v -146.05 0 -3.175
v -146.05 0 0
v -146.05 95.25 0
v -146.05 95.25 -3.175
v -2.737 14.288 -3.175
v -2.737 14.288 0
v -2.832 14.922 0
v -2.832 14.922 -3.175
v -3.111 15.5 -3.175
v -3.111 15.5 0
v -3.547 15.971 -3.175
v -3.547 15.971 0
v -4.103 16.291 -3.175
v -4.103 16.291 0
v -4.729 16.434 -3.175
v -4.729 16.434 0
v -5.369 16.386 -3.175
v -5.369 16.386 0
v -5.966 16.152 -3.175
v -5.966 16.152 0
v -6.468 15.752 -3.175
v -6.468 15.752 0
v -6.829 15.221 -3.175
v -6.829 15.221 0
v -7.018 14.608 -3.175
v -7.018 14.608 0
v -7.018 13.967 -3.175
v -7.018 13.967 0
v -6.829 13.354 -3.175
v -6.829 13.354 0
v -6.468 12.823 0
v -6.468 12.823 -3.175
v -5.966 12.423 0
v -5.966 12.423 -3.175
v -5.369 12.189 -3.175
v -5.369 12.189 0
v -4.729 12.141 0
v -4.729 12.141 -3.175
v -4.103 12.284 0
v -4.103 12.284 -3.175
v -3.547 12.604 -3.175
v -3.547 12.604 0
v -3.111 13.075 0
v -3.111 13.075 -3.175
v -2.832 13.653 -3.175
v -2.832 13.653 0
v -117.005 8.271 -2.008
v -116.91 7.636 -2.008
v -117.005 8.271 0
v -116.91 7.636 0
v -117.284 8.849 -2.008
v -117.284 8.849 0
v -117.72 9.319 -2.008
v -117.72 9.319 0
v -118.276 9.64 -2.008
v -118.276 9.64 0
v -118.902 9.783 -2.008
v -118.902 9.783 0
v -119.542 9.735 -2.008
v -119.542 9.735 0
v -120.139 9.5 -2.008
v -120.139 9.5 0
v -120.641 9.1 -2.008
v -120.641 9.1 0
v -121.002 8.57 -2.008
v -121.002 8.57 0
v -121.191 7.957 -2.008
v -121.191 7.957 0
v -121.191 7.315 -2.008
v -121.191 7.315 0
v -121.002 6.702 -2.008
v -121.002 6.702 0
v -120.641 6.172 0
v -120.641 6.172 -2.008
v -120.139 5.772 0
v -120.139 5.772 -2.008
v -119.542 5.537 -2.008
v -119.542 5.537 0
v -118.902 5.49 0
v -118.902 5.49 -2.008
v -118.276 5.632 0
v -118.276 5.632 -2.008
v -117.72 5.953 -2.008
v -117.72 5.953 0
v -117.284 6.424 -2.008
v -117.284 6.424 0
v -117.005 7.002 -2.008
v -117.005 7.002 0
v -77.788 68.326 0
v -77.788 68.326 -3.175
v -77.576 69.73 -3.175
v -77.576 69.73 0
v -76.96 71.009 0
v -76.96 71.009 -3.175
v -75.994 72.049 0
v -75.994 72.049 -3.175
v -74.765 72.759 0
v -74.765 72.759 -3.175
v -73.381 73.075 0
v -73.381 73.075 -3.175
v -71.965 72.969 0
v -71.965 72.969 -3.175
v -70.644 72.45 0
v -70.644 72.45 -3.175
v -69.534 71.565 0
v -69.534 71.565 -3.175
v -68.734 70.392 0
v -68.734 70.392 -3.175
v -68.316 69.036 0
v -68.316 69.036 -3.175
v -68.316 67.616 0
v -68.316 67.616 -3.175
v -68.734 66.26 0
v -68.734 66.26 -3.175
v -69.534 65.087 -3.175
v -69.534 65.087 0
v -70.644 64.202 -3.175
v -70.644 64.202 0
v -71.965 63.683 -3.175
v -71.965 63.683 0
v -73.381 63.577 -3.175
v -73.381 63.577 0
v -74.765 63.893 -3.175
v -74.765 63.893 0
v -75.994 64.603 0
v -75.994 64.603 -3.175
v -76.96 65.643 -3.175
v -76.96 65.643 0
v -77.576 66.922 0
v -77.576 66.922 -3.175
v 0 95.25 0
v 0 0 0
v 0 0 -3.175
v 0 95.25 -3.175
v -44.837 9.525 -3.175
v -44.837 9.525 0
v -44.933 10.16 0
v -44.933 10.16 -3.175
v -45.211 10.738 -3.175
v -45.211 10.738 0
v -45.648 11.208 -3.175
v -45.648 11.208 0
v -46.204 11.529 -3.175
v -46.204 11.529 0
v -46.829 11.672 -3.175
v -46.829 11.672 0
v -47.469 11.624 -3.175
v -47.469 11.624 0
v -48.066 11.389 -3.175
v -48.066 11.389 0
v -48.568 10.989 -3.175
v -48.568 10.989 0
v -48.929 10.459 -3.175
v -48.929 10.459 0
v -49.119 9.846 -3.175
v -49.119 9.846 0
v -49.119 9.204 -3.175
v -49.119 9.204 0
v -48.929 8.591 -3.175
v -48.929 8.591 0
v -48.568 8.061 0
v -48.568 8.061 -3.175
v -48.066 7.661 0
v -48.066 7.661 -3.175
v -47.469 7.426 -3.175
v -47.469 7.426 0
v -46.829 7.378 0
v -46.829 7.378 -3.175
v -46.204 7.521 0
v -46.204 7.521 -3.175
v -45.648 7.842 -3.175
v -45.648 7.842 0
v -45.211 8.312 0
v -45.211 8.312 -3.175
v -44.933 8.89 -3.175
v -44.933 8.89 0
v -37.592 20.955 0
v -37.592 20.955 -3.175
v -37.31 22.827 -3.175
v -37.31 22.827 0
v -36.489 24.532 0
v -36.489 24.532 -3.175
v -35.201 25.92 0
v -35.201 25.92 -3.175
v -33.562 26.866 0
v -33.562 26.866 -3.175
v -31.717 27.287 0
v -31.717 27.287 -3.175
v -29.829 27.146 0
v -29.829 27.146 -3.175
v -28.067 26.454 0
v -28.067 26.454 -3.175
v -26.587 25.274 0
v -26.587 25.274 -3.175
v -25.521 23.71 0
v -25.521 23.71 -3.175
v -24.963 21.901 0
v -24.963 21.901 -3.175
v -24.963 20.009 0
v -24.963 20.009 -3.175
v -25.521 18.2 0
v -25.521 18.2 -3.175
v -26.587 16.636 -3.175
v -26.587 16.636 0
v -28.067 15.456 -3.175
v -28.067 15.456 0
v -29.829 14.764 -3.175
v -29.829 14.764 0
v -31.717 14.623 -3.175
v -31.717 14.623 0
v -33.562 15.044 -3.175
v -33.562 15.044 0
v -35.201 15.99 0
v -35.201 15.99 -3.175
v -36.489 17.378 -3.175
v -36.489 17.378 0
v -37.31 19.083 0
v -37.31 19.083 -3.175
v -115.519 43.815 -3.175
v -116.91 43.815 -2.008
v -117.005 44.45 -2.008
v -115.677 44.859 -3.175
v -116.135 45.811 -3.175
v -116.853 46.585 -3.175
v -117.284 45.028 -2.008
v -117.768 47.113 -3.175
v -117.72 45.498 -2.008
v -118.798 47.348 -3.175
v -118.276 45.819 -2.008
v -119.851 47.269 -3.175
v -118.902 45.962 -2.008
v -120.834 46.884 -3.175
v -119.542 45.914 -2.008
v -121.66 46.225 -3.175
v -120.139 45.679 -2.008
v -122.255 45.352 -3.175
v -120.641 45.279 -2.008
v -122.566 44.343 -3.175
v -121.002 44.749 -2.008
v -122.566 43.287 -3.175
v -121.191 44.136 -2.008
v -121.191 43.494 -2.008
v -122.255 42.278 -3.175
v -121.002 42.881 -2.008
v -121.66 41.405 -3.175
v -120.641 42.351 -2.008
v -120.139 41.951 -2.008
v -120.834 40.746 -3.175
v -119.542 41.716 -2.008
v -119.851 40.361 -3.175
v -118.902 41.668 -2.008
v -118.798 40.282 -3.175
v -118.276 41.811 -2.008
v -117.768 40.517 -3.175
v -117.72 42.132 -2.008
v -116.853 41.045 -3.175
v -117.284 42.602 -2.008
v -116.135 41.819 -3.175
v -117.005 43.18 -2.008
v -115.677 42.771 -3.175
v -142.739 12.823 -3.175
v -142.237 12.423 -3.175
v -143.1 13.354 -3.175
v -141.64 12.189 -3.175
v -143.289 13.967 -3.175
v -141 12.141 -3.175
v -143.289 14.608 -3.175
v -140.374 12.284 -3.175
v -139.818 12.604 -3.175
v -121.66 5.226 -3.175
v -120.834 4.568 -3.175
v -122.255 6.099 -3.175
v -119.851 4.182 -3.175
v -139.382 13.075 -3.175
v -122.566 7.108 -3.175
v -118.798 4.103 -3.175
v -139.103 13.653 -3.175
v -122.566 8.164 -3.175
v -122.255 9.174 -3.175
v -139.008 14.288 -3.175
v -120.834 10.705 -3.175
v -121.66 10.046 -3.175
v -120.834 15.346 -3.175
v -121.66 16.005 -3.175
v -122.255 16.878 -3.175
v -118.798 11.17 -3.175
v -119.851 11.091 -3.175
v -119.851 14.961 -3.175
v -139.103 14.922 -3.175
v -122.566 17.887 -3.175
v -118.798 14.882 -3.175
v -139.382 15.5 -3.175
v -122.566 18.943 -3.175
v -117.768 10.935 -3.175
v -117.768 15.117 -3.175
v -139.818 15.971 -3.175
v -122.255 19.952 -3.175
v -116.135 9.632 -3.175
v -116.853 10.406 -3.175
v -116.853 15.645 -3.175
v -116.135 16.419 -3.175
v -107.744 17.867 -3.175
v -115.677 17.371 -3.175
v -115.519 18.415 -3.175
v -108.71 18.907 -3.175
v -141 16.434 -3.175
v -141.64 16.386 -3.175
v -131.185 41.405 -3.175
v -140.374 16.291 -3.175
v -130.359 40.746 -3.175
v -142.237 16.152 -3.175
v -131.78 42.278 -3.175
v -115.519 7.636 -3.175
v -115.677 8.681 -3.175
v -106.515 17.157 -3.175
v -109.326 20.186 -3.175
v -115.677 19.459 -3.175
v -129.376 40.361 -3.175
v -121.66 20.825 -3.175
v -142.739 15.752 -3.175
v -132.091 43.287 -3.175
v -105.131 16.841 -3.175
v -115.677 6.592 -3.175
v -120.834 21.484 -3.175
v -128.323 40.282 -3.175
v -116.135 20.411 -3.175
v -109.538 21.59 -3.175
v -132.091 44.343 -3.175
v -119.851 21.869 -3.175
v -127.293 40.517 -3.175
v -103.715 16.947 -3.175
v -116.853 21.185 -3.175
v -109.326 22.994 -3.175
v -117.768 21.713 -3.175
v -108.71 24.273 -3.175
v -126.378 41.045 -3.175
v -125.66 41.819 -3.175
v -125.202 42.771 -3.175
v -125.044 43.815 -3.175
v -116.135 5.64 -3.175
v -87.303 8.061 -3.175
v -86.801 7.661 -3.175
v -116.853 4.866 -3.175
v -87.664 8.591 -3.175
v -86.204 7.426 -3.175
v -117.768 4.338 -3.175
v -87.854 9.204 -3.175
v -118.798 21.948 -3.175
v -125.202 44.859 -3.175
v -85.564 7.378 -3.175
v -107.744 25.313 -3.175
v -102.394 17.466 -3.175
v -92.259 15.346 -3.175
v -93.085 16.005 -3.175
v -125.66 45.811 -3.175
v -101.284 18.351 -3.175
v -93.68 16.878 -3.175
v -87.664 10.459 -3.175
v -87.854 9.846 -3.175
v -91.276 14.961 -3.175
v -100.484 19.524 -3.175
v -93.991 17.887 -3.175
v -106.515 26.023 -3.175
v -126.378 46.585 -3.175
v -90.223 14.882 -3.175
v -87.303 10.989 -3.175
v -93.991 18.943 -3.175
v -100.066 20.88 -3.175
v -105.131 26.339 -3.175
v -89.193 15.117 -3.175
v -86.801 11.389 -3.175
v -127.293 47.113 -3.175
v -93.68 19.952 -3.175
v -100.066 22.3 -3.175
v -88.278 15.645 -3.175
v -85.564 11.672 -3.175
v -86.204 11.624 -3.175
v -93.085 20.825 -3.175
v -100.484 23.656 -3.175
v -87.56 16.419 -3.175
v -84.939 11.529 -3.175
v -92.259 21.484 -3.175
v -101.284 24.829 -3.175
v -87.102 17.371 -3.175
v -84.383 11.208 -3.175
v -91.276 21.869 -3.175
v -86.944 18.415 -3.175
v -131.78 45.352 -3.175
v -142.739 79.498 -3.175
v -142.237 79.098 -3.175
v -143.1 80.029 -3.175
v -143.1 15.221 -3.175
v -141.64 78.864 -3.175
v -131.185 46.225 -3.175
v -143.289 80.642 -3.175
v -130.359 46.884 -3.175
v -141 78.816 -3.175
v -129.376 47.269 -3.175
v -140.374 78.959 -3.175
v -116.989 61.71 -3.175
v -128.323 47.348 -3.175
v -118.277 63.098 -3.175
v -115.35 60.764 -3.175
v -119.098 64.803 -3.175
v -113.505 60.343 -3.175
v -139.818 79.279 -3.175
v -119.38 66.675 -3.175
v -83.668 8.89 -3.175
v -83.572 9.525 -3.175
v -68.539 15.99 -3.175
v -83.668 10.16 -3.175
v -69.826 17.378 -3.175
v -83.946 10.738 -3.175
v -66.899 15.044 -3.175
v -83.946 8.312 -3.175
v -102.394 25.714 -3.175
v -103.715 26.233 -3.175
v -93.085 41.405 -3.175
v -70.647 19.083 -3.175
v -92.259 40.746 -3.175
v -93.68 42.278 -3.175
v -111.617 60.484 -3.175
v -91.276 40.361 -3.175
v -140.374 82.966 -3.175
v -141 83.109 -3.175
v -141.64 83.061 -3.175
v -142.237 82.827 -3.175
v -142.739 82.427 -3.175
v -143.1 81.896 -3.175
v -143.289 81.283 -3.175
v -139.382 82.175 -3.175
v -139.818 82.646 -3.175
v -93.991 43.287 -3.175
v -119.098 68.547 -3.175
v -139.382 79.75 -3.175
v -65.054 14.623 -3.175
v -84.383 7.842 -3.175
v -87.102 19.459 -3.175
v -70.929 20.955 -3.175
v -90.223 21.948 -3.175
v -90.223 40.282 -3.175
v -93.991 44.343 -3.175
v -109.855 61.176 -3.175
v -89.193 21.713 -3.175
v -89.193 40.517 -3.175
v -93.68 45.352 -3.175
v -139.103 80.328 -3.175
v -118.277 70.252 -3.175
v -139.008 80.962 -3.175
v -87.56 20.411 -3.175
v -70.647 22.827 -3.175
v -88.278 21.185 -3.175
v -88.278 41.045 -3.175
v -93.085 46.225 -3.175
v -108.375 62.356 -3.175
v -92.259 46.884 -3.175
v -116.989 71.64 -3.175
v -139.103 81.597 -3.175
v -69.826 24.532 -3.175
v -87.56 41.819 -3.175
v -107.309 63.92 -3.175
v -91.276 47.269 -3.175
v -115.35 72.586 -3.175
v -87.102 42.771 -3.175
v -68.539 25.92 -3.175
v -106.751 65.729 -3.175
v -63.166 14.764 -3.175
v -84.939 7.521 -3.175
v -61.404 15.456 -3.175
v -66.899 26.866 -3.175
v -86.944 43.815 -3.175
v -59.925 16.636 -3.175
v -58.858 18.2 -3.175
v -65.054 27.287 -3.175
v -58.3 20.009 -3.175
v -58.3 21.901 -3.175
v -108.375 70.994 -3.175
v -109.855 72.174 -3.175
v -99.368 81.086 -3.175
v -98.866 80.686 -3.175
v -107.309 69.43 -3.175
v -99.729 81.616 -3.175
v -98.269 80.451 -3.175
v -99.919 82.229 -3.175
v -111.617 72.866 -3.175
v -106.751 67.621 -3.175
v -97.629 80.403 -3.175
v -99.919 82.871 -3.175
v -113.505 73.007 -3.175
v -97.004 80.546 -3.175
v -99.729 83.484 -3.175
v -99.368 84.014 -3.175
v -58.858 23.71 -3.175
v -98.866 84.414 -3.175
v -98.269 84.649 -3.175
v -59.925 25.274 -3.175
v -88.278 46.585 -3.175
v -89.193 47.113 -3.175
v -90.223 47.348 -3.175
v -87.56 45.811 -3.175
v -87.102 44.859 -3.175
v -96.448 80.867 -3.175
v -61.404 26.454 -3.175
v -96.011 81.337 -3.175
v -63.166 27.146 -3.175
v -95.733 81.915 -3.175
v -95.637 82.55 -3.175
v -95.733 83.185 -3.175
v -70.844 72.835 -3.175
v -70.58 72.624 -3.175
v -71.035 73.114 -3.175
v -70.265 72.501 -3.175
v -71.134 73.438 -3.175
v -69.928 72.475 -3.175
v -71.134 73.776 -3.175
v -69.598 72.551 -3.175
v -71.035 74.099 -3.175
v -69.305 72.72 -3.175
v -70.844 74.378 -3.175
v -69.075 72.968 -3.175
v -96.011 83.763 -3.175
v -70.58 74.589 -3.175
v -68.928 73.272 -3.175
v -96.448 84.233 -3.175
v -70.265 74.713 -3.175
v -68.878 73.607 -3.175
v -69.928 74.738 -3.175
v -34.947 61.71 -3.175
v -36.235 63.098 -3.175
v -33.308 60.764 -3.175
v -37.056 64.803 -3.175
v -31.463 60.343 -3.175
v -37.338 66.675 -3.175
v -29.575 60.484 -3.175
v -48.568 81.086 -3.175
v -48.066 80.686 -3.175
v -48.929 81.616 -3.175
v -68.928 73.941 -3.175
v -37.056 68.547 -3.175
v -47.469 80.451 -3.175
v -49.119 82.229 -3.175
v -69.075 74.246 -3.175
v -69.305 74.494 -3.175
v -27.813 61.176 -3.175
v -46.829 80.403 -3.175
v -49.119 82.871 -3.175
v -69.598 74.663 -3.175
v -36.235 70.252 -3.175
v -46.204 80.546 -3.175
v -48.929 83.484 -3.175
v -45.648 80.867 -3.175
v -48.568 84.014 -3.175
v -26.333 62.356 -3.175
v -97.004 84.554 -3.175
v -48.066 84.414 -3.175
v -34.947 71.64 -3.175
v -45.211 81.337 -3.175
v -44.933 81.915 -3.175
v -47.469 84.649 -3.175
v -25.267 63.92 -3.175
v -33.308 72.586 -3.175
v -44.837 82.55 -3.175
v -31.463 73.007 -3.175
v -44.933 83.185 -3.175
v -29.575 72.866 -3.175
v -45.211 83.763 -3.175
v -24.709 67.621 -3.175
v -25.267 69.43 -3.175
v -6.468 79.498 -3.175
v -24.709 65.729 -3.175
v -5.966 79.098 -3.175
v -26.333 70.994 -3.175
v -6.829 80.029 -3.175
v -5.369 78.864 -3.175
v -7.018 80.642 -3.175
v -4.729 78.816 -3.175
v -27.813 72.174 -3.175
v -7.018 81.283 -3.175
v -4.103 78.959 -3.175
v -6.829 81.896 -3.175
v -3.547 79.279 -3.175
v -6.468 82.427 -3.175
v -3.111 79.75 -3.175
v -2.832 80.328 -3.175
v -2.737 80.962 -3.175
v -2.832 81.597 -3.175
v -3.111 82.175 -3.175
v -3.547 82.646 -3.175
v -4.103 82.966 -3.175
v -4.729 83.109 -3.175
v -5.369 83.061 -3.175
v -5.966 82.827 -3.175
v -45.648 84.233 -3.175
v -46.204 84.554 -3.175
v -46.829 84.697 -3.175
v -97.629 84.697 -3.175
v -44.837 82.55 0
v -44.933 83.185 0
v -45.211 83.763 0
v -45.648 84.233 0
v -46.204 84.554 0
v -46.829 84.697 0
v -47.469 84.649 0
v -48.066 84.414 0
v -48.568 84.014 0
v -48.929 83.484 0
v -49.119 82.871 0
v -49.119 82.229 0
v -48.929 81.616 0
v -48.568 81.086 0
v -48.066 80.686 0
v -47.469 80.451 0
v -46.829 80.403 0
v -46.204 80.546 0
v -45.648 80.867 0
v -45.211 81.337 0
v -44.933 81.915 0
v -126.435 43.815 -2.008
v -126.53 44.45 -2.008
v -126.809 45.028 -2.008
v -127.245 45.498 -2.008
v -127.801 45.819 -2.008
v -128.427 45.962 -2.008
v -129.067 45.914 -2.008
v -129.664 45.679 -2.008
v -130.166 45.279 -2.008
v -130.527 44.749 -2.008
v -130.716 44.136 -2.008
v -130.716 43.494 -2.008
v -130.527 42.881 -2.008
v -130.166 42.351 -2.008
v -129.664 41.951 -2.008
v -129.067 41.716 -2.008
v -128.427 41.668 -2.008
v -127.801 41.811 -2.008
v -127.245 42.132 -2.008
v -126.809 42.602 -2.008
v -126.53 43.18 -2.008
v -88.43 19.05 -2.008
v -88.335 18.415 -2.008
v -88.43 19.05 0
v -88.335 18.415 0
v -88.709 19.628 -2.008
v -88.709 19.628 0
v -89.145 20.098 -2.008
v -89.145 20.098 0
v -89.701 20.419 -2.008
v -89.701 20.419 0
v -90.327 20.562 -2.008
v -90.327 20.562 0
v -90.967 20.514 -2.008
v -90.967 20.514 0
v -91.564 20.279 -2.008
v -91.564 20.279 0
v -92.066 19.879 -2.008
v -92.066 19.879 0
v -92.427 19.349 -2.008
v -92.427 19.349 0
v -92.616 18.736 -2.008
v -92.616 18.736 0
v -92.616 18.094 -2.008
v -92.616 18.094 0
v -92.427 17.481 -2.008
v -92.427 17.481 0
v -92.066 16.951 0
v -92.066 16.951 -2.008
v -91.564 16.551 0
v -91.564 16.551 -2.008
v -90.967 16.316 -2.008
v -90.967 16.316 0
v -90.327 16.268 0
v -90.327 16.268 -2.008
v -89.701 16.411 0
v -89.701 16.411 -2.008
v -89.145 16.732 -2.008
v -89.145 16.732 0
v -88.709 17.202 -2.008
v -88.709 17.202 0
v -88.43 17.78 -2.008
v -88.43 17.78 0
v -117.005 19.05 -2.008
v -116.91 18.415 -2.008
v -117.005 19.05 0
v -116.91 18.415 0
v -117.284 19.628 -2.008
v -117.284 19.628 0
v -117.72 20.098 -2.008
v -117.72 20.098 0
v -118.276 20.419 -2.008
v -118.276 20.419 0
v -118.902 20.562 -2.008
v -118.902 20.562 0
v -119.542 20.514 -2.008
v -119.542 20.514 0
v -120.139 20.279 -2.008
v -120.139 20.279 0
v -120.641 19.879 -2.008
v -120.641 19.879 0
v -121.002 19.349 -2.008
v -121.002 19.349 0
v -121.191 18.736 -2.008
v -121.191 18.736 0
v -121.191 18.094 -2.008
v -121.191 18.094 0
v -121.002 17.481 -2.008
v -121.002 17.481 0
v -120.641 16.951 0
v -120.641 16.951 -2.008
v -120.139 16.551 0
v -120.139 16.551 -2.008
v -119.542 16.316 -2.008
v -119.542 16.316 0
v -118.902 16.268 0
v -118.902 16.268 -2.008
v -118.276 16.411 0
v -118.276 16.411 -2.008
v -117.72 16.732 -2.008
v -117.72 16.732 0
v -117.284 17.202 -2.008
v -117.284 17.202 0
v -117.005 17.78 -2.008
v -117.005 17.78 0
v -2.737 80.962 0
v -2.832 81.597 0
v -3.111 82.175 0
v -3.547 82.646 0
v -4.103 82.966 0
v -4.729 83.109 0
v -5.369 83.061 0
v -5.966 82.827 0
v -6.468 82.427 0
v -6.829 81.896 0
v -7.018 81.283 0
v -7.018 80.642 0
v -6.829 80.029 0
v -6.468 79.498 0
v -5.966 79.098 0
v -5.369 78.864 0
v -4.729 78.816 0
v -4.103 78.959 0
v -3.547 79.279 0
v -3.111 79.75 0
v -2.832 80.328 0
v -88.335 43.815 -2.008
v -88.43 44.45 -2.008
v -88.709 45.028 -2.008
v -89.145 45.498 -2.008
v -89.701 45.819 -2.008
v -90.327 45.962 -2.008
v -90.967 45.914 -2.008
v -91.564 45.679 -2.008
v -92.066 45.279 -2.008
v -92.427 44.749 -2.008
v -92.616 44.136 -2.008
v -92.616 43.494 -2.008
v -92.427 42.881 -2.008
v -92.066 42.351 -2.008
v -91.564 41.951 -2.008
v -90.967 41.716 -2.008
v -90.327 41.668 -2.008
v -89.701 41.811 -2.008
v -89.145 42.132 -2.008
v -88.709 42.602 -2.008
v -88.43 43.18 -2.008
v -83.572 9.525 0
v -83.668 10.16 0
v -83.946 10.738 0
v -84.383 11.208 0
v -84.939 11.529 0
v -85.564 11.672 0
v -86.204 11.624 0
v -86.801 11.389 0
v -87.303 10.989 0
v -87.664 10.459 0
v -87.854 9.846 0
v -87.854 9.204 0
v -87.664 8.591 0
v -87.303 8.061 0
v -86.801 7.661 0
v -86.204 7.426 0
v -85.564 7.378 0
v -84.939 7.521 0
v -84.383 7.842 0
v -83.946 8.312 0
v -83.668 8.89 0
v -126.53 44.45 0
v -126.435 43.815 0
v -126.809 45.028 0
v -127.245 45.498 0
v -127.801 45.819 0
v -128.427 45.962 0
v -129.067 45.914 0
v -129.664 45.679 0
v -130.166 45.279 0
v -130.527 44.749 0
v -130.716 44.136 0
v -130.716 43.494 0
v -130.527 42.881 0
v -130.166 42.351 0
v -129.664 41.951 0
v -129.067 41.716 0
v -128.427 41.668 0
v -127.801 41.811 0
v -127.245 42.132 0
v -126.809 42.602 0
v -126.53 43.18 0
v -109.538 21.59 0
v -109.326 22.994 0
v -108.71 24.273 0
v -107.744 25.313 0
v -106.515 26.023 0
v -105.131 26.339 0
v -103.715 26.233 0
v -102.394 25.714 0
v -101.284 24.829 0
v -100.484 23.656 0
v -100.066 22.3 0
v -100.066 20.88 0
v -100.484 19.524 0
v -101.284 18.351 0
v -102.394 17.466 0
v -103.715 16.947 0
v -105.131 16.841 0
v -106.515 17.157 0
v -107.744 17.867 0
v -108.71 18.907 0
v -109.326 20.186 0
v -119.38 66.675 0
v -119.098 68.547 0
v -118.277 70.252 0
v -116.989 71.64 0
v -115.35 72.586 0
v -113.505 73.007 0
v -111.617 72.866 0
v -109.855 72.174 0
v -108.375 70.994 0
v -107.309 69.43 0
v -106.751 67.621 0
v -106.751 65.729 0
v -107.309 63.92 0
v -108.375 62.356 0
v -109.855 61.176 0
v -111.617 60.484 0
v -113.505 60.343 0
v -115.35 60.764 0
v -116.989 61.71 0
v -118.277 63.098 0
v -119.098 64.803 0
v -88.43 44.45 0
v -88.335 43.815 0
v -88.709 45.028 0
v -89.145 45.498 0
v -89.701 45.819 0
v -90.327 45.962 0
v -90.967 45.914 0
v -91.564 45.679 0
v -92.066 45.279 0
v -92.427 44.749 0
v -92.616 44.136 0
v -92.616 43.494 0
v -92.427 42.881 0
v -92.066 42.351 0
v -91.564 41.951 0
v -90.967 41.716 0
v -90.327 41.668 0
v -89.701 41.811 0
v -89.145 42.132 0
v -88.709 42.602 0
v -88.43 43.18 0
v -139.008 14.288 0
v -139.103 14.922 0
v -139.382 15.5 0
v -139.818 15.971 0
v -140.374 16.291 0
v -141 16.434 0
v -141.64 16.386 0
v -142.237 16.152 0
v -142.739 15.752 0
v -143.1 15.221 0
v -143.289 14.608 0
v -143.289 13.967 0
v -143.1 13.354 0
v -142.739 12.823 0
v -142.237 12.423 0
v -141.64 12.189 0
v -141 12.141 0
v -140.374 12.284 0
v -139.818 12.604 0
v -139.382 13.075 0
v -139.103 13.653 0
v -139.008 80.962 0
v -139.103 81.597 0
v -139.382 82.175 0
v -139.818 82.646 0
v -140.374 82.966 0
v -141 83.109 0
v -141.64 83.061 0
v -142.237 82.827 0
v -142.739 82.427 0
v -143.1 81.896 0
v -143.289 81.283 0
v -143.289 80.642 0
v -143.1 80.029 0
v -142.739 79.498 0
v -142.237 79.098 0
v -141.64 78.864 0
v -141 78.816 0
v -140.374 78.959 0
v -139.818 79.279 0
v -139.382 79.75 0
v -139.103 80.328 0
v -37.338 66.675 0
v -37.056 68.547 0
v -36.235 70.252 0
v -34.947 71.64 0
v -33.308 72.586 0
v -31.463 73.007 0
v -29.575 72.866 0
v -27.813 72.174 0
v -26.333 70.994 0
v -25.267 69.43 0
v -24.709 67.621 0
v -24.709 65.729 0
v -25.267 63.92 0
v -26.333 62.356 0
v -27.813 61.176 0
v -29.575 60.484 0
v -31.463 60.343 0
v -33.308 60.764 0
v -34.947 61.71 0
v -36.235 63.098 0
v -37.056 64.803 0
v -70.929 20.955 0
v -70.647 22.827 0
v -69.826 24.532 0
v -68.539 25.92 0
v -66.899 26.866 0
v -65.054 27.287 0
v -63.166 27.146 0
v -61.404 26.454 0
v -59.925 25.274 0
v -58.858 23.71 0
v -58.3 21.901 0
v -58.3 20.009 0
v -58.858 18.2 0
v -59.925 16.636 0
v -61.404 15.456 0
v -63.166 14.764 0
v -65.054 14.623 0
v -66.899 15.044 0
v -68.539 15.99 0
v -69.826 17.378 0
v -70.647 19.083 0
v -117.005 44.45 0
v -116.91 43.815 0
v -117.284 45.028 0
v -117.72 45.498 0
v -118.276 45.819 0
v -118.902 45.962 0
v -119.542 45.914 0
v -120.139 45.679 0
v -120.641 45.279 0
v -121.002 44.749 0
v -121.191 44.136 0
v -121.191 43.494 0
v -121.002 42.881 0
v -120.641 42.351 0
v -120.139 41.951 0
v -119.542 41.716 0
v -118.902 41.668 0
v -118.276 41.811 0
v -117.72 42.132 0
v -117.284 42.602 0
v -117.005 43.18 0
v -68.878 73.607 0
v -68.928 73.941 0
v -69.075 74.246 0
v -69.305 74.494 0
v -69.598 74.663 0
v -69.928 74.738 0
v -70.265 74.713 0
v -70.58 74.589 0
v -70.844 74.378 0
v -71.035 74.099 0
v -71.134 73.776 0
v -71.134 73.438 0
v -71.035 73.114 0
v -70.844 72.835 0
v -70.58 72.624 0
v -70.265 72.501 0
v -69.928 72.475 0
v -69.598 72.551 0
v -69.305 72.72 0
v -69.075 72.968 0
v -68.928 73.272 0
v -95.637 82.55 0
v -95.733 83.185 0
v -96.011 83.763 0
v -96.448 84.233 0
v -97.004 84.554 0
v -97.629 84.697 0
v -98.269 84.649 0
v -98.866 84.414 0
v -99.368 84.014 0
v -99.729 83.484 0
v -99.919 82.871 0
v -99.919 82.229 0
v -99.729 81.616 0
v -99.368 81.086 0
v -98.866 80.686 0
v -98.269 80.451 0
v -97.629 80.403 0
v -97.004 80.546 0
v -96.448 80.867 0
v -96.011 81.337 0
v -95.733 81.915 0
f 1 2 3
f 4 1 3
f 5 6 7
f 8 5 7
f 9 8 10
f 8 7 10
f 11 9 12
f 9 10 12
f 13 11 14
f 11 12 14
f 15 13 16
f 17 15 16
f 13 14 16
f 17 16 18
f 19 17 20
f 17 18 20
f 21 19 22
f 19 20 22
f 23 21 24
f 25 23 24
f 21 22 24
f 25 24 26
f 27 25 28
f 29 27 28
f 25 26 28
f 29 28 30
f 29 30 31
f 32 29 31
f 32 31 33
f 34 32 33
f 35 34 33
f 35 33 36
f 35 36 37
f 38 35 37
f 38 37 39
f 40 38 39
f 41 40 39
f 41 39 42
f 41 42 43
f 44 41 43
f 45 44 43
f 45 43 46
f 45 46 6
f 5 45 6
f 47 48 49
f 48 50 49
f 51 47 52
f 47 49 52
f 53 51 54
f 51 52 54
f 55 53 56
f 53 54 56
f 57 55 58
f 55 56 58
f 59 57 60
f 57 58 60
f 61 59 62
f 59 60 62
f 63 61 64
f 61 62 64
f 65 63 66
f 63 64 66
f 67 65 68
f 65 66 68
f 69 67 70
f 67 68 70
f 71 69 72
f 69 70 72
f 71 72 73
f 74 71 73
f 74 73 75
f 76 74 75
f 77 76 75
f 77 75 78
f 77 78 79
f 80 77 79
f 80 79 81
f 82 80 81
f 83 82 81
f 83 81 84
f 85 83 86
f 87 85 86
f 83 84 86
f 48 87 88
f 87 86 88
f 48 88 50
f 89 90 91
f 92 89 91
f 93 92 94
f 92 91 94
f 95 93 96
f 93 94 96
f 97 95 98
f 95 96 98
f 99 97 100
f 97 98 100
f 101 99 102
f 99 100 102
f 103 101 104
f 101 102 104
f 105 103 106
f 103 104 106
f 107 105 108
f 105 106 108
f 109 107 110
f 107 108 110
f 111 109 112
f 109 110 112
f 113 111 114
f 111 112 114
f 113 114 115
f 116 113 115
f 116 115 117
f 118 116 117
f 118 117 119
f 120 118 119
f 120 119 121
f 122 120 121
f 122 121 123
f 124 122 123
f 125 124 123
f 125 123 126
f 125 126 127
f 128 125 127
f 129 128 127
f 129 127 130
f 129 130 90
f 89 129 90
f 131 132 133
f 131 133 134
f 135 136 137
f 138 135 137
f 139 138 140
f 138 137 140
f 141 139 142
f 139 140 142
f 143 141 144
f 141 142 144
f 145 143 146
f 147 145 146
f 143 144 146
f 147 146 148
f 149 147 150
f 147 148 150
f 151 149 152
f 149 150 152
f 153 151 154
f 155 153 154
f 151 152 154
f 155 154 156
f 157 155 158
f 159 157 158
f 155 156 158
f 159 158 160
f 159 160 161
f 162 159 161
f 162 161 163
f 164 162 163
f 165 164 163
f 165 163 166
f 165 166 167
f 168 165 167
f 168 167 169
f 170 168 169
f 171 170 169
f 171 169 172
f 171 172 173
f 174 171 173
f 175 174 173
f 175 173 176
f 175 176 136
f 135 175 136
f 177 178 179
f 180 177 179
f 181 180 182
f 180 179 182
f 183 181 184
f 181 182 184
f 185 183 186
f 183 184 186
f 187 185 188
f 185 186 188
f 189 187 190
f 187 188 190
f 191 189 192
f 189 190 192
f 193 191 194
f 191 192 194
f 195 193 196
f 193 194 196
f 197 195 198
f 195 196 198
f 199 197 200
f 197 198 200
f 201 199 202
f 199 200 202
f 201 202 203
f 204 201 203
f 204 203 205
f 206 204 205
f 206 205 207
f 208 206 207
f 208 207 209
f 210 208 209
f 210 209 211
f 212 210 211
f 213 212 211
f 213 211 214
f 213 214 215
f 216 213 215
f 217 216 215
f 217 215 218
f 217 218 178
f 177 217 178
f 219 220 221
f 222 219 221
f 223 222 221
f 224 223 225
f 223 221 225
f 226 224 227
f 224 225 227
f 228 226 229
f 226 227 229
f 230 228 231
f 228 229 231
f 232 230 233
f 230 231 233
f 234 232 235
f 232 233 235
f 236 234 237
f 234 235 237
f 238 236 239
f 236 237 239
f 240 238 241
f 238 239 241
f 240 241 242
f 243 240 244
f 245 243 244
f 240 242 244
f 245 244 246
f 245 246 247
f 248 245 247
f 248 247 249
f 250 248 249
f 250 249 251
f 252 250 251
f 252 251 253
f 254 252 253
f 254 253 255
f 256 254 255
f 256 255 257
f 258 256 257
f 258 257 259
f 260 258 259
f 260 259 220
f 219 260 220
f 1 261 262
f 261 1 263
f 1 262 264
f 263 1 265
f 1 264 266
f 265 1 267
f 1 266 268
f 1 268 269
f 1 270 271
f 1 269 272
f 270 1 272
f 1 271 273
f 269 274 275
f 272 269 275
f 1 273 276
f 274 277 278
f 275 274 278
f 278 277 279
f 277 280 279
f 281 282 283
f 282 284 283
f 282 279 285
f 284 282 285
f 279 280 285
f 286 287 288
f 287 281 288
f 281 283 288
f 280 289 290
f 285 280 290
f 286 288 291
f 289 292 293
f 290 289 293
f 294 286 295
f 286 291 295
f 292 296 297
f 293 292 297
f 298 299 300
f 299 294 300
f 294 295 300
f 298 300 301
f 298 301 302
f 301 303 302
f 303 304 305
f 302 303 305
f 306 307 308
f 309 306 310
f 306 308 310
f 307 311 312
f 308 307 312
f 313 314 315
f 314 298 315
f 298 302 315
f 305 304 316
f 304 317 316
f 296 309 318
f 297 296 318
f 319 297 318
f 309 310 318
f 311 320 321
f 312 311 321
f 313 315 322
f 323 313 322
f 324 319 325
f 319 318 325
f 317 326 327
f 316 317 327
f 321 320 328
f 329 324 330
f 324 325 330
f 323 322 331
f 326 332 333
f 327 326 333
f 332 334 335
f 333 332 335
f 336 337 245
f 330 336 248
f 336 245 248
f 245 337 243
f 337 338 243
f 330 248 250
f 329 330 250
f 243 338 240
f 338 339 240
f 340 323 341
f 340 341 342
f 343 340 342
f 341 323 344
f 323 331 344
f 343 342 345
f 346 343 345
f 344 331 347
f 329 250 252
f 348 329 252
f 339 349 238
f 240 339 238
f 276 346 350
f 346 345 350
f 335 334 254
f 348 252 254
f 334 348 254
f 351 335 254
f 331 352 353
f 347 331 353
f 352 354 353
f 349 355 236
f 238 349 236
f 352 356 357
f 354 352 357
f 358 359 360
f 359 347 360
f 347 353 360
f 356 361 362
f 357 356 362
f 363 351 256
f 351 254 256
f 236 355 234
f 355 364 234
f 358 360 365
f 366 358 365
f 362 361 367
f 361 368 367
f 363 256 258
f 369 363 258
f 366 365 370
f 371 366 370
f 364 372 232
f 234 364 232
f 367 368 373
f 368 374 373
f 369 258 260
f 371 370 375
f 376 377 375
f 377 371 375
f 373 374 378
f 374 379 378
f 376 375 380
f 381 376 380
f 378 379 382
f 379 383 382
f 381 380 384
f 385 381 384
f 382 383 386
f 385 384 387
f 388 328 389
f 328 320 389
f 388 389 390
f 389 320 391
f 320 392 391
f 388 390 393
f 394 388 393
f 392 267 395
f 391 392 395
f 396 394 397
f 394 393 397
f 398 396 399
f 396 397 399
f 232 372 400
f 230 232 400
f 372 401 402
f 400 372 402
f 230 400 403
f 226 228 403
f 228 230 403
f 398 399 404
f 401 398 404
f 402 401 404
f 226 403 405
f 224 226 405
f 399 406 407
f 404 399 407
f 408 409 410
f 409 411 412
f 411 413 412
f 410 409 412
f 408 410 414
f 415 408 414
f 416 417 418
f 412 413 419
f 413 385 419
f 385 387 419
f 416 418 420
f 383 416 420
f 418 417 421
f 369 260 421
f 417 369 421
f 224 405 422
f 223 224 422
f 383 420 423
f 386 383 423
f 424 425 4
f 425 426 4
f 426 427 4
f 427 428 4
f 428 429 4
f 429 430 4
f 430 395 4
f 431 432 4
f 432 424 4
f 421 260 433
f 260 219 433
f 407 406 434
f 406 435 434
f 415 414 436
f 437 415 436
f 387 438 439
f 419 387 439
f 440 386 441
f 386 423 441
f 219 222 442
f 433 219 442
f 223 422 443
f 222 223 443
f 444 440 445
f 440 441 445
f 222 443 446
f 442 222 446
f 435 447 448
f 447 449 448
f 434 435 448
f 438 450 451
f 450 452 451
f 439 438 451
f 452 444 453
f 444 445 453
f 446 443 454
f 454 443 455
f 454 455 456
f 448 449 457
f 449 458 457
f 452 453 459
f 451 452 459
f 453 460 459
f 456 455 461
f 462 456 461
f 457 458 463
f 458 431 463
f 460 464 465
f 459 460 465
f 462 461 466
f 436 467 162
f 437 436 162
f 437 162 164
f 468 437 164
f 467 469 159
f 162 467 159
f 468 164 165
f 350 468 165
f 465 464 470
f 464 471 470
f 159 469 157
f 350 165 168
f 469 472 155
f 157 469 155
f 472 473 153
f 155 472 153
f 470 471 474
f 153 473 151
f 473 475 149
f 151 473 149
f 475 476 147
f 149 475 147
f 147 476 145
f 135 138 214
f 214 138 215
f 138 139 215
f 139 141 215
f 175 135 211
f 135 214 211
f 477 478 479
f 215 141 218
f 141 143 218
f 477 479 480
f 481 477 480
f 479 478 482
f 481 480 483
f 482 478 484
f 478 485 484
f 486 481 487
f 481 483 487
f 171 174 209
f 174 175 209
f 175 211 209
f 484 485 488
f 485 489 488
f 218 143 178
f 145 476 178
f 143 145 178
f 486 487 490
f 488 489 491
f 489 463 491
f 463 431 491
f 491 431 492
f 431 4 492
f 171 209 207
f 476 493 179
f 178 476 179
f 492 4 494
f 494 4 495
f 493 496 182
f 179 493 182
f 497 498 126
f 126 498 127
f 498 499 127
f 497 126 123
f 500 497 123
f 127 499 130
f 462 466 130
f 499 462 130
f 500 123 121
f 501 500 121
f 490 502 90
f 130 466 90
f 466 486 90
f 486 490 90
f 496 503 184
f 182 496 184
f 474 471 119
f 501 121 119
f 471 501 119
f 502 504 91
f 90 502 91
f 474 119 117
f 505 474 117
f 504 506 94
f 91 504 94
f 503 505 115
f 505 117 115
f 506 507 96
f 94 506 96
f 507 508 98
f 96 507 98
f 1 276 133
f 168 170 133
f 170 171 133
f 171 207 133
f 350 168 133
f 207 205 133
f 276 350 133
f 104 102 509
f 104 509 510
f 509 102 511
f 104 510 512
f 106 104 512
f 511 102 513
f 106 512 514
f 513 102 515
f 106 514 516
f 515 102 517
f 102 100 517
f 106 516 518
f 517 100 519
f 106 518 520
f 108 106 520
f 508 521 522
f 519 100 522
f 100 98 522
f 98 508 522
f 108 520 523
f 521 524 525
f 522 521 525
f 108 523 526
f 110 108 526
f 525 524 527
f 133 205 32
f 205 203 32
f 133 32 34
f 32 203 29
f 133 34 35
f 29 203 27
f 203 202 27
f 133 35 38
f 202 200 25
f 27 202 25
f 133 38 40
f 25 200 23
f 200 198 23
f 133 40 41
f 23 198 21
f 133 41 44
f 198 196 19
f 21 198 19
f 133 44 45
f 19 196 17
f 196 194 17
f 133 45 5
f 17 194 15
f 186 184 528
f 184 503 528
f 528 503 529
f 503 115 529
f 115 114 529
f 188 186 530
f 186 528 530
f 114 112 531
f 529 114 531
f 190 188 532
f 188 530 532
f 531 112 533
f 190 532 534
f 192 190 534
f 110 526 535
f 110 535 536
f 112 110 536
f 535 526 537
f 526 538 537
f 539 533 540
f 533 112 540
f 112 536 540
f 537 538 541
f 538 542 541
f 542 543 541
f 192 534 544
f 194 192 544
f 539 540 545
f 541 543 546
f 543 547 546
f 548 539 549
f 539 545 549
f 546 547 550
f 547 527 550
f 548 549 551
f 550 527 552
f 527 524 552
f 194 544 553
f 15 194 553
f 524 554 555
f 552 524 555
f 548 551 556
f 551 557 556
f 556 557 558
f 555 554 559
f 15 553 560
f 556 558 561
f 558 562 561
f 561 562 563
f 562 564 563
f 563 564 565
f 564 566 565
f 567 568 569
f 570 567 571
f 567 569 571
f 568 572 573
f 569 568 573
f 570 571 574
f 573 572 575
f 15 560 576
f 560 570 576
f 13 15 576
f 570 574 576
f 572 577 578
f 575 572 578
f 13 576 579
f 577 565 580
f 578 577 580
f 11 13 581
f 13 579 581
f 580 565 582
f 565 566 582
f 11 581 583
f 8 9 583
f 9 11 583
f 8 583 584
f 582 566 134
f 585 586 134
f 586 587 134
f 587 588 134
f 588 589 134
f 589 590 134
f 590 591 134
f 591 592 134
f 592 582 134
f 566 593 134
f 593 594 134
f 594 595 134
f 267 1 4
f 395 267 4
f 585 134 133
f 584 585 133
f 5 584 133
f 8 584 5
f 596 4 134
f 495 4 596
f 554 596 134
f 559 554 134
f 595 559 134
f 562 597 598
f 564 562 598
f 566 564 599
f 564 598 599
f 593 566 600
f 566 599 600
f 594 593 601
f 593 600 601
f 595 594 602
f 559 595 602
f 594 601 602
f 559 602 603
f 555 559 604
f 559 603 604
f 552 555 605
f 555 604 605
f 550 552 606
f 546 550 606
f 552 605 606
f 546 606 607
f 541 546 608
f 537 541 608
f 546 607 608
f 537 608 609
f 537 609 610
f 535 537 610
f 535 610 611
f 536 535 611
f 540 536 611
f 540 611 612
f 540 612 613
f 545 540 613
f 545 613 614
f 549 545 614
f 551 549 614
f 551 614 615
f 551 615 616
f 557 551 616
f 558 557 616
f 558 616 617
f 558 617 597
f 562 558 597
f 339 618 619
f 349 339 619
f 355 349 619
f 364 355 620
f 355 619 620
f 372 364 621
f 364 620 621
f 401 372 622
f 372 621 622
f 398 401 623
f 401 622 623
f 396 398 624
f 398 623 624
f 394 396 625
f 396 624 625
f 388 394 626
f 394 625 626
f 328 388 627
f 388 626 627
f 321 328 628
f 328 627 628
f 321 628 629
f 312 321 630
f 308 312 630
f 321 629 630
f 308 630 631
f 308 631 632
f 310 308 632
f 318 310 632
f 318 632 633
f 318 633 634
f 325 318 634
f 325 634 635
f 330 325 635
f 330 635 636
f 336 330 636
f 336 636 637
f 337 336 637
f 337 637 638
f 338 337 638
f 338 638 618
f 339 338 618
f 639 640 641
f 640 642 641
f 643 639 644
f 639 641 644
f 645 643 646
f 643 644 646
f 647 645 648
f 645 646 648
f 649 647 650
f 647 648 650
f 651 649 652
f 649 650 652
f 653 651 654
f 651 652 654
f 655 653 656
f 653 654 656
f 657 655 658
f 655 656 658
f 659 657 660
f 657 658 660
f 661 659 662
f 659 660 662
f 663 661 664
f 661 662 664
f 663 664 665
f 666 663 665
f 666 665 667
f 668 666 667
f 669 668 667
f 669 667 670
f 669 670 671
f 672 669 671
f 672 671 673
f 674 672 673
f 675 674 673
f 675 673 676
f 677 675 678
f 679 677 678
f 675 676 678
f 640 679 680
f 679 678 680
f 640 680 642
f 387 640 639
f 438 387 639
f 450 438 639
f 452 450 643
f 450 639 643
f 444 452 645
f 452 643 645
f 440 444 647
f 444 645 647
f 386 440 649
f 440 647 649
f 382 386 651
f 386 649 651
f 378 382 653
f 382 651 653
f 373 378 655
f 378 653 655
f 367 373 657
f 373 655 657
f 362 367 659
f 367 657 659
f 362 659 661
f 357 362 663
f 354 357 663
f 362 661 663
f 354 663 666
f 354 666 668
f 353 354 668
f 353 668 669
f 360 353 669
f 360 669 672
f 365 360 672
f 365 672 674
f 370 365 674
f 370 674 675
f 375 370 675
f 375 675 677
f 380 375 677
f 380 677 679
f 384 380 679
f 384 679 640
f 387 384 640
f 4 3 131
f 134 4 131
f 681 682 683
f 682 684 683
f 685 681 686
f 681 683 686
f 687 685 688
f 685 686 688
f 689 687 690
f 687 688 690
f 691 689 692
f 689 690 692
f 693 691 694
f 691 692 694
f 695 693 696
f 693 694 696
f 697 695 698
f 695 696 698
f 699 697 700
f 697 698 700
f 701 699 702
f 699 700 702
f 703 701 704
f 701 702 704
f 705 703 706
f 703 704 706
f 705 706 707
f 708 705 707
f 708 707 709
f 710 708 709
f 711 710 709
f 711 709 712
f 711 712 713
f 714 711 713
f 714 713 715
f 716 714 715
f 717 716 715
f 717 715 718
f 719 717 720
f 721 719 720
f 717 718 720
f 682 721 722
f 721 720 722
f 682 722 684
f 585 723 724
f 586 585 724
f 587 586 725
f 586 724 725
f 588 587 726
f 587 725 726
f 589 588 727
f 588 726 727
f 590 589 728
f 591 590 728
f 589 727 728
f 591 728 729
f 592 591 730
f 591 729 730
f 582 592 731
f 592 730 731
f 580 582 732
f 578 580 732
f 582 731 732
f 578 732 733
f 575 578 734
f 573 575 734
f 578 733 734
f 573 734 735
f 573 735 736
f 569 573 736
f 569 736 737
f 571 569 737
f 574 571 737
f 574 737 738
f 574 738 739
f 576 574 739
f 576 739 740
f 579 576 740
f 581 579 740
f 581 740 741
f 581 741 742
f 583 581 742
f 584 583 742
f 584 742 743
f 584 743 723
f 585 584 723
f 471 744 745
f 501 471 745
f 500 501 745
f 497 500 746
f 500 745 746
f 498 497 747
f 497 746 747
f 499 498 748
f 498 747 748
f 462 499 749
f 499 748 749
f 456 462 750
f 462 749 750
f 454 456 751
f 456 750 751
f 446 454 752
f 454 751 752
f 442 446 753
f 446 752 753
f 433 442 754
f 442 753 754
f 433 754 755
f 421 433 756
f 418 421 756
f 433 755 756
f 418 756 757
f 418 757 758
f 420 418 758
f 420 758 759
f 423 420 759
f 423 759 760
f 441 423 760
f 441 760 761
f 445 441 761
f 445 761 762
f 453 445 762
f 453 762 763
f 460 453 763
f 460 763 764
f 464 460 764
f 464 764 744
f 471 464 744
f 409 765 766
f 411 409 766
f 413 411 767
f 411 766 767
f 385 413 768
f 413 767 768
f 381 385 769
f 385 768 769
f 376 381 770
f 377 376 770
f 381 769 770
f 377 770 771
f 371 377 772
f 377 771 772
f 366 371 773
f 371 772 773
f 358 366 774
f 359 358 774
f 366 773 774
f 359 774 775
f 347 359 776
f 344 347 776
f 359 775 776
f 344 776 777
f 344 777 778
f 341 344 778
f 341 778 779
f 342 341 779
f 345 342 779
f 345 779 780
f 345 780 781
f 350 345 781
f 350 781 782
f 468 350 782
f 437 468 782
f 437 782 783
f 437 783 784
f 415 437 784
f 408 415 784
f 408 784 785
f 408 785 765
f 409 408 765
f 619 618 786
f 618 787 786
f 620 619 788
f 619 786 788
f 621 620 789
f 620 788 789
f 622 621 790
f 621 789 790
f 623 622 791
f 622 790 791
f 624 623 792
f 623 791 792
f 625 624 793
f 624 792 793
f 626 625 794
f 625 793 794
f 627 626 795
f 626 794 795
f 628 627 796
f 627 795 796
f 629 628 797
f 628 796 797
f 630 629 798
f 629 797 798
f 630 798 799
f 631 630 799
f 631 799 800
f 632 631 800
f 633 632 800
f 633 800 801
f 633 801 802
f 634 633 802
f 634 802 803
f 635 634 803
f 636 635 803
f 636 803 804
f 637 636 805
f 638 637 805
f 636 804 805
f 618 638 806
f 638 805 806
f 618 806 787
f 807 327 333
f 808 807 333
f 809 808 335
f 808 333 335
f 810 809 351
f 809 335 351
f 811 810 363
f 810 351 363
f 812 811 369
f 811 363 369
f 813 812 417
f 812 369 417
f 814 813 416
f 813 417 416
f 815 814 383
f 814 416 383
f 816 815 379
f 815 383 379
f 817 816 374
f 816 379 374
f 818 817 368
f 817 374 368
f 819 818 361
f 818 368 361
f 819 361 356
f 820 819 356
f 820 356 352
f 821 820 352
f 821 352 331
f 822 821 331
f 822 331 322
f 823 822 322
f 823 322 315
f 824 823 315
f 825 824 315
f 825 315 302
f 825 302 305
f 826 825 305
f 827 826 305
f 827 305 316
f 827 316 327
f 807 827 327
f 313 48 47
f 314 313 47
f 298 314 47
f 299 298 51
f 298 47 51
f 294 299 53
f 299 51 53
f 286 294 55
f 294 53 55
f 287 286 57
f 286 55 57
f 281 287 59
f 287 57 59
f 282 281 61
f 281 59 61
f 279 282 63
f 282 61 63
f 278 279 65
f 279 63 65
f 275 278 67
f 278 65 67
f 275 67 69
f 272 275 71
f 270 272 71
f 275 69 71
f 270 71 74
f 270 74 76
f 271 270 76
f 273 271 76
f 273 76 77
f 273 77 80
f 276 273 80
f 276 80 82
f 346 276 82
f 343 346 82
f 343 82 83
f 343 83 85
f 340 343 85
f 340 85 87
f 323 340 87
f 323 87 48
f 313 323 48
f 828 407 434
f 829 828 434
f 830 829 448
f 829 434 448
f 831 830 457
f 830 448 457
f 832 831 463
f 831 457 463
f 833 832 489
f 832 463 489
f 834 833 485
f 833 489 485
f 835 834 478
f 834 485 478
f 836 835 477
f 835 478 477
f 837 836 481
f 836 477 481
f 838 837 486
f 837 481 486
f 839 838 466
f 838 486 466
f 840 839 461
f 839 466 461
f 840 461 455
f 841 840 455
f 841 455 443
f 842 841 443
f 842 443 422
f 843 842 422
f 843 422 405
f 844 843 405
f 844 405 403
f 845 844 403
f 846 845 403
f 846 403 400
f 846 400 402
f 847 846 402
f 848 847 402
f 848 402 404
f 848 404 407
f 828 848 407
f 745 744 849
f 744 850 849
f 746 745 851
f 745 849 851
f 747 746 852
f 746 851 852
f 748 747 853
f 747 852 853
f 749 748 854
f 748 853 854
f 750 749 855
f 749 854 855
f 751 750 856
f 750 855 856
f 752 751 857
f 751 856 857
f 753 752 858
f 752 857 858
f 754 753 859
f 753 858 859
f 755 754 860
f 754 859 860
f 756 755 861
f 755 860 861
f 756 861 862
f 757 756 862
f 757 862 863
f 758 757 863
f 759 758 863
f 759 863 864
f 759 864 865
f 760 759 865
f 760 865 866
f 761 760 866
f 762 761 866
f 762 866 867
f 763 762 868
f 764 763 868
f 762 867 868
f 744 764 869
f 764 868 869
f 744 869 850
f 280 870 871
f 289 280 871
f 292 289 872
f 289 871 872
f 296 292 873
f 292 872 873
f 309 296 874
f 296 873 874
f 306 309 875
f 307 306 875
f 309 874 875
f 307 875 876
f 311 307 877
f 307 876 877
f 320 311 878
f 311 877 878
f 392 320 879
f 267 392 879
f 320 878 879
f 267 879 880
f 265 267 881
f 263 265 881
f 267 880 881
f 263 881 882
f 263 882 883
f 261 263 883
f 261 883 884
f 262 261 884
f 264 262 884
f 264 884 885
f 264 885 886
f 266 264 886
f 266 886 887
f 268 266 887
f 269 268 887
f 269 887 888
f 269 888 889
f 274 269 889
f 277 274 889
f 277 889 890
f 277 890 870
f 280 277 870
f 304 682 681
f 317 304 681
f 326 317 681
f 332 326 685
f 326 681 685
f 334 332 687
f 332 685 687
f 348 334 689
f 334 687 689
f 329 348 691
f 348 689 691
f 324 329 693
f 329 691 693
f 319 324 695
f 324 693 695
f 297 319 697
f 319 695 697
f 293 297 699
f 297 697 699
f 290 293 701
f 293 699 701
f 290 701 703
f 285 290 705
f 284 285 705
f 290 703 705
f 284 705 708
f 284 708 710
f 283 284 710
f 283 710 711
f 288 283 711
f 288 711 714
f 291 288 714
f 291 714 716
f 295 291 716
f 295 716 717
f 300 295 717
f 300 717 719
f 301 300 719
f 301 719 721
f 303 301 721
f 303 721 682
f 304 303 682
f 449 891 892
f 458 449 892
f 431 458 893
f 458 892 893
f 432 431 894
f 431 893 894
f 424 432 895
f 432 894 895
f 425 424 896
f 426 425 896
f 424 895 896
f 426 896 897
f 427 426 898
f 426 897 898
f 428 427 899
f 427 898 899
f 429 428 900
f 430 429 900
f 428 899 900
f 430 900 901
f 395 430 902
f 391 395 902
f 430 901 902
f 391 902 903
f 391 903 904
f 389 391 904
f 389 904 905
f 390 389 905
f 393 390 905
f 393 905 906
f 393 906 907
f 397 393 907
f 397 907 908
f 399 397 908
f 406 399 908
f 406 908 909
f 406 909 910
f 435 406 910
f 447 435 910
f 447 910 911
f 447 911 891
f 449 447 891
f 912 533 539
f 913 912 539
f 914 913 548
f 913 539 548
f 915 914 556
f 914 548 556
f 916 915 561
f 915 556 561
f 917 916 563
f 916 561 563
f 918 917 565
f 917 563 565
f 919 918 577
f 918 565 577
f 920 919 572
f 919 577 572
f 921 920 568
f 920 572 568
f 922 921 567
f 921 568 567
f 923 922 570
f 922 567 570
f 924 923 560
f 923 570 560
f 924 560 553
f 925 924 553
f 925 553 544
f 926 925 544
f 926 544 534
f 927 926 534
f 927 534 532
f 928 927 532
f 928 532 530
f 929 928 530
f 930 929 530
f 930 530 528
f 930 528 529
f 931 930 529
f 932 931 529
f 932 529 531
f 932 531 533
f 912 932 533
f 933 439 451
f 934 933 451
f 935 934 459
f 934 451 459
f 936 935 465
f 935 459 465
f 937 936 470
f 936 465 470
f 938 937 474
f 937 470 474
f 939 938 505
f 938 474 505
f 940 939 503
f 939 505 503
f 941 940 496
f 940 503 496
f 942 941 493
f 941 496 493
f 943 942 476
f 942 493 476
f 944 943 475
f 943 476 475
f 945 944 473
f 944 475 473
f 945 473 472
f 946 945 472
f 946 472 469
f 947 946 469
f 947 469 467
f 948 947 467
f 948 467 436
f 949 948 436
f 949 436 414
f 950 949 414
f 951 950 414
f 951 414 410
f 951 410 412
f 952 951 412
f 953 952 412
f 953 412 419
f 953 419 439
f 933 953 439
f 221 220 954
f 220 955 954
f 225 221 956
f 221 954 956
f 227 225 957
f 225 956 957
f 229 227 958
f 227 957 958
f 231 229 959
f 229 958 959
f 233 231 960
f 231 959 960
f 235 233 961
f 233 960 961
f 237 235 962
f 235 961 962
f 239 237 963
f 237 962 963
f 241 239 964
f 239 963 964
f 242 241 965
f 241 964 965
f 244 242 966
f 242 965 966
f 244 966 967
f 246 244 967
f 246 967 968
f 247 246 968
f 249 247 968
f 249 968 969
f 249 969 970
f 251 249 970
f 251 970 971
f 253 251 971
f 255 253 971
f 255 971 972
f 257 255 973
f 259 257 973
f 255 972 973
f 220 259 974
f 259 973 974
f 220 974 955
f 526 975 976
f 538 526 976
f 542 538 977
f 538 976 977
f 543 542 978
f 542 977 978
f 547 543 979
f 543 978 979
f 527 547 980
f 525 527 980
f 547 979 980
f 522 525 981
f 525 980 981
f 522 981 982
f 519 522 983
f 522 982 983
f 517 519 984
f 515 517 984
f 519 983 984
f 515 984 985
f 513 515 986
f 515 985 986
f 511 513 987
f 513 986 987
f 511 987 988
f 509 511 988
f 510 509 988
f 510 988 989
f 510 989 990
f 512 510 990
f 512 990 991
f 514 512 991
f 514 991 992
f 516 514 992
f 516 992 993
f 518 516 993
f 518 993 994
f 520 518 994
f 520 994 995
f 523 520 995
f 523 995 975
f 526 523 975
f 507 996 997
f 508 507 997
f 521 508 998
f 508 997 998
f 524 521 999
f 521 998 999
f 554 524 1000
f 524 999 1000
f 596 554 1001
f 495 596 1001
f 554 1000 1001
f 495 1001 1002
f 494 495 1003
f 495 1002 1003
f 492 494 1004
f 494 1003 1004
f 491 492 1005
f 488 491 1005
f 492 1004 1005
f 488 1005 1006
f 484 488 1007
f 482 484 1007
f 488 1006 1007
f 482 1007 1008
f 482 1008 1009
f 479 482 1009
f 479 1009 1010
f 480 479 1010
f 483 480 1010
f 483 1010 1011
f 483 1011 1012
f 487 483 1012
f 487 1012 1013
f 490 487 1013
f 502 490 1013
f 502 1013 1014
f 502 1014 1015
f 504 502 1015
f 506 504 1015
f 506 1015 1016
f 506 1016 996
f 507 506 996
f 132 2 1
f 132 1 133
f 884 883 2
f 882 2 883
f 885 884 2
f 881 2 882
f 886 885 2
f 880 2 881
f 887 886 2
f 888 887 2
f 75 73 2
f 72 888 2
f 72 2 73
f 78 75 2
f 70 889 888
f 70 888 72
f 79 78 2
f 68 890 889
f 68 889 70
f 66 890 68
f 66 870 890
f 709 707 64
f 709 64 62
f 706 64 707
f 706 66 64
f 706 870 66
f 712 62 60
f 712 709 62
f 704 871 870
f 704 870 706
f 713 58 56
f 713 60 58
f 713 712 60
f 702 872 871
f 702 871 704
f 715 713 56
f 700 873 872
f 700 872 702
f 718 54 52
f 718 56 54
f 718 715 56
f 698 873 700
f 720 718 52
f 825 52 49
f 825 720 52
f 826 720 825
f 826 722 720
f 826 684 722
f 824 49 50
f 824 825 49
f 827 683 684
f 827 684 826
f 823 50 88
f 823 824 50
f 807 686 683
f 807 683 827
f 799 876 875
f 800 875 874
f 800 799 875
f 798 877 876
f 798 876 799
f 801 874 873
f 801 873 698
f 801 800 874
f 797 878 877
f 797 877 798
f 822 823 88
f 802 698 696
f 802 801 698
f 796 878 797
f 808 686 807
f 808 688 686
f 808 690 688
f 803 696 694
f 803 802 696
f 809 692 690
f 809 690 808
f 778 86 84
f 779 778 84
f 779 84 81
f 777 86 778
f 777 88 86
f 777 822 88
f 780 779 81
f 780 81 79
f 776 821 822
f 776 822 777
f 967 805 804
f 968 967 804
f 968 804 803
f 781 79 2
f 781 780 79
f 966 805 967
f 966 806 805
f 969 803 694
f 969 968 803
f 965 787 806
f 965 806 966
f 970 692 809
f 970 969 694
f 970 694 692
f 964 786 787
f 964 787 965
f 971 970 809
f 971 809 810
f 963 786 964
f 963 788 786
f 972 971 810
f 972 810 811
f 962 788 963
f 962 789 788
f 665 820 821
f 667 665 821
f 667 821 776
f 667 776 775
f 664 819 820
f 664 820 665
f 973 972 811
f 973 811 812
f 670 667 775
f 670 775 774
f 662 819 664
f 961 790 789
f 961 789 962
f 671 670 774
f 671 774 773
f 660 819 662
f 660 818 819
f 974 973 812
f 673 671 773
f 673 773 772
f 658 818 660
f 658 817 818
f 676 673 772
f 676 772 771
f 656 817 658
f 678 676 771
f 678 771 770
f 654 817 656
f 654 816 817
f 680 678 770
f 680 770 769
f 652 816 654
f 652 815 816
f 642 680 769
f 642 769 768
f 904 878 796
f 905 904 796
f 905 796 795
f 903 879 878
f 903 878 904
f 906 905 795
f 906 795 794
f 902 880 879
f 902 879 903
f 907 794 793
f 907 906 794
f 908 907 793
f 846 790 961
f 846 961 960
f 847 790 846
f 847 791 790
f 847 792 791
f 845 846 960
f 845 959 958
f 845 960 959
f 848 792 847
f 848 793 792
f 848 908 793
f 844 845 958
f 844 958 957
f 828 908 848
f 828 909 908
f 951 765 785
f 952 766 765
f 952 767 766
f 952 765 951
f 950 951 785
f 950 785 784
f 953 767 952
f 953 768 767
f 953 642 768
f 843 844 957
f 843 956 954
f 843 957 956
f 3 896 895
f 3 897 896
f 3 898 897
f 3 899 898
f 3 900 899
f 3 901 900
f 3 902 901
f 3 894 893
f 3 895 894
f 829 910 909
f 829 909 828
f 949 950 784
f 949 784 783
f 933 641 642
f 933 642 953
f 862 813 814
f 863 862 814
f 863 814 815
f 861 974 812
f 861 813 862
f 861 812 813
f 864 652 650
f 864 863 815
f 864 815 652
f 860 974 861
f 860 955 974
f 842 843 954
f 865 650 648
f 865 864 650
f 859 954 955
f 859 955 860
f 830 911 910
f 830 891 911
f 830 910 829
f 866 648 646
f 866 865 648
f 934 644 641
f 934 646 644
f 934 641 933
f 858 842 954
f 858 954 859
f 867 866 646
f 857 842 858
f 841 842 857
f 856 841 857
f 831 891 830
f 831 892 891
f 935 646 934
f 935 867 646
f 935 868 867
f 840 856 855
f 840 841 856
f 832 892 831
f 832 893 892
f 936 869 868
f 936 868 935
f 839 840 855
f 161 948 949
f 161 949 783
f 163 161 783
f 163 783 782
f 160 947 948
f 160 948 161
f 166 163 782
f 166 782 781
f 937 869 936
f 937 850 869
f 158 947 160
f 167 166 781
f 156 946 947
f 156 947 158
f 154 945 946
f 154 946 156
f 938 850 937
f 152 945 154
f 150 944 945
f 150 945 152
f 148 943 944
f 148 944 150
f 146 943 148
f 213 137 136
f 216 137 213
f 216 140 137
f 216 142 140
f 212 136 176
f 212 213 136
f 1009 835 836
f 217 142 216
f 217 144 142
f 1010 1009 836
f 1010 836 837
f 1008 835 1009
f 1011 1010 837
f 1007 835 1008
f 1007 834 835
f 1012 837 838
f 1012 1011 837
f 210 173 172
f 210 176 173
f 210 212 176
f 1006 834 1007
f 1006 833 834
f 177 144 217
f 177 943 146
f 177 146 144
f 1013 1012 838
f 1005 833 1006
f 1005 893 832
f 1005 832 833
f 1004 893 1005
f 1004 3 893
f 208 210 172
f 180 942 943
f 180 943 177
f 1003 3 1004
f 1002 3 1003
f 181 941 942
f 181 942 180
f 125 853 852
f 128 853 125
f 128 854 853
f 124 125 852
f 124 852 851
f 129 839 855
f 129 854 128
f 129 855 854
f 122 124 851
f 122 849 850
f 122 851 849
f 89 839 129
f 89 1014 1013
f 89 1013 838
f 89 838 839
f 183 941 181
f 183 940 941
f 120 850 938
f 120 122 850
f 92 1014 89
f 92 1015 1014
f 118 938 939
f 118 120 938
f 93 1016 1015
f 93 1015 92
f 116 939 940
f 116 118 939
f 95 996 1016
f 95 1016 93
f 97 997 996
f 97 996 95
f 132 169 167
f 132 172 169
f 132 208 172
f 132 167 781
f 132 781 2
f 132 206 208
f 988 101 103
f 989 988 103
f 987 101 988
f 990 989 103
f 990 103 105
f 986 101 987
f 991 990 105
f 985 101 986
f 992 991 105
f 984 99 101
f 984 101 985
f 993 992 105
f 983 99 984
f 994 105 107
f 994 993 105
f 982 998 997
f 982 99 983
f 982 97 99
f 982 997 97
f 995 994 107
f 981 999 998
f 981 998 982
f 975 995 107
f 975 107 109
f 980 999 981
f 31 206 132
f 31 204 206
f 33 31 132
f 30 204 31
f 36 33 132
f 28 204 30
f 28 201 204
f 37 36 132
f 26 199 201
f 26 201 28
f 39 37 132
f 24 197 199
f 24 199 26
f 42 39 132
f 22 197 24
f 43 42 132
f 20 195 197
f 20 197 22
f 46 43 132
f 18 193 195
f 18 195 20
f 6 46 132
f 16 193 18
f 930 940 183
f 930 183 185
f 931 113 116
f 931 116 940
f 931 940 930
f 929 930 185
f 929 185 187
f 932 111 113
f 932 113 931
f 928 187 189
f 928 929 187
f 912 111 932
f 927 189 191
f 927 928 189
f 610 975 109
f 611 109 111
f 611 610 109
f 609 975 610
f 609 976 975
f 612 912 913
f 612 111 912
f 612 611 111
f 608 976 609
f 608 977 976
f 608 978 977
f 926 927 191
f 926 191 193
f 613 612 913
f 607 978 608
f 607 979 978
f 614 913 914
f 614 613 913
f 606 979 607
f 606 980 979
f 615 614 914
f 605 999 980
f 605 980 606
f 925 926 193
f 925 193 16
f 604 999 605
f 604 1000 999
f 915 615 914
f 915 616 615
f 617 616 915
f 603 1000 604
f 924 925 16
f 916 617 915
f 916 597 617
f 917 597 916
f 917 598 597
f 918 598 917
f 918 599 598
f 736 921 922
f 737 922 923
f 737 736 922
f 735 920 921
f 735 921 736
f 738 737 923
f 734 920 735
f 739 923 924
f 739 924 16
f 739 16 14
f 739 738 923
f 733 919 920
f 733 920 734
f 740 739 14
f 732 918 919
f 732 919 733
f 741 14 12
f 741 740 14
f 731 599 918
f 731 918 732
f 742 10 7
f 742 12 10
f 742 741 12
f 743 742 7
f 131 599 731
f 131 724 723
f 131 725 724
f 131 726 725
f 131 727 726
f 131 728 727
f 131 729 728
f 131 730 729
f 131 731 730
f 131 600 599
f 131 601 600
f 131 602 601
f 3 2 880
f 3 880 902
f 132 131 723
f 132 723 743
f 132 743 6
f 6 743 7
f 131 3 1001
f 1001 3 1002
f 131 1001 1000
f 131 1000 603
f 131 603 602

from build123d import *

# Parameters (mm, degrees)
SKETCH1_W                                         = 146.05
SKETCH1_H                                         = 95.25
BOSS_EXTRUDE1_DEPTH                               = 3.175
F_6_CLEARANCE_HOLE1_D                             = 4.3053
SKETCH5_R                                         = 6.35
SKETCH5_R_2                                       = 4.7625
CUT_EXTRUDE1_DEPTH                                = 8.4676
CSK_FOR_6_FLAT_HEAD_MACHINE_SCREW_100_D           = 4.3053
CSK_FOR_6_FLAT_HEAD_MACHINE_SCREW_100_CSINK_D     = 7.0866
CSK_FOR_6_FLAT_HEAD_MACHINE_SCREW_100_CSINK_ANGLE = 100
SKETCH8_R                                         = 1.134488875
CUT_EXTRUDE2_DEPTH                                = 4.175


with BuildPart() as part:
    # Sketch1 → Boss-Extrude1 (new body)
    with BuildSketch(Plane.XY):
        with Locations((-73.025, 47.625)):
            Rectangle(SKETCH1_W, SKETCH1_H)
    extrude(amount=-BOSS_EXTRUDE1_DEPTH)

    # #6 Clearance Hole1 (through all)
    with Locations(Plane(origin=(0, 0, -3.175), x_dir=(-1, 0, 0), z_dir=(0, 0, -1))):
        with Locations((4.8895, 80.9625), (141.1605, 80.9625), (141.1605, 14.2875), (4.8895, 14.2875), (46.99, 9.525), (85.725, 9.525), (97.79, 82.55), (46.99, 82.55)):
            Hole(F_6_CLEARANCE_HOLE1_D / 2)

    # Sketch5 → Cut-Extrude1 (cut, through all)
    with BuildSketch(Plane(origin=(0, 0, -7.4676), x_dir=(-1, 0, 0), z_dir=(0, 0, -1))):
        with Locations((30.988, 66.675)):
            Circle(SKETCH5_R)
        with Locations((113.03, 66.675)):
            Circle(SKETCH5_R)
        with Locations((64.5795, 20.955)):
            Circle(SKETCH5_R)
        with Locations((31.242, 20.955)):
            Circle(SKETCH5_R)
        with Locations((73.025, 68.326)):
            Circle(SKETCH5_R_2)
        with Locations((104.775, 21.59)):
            Circle(SKETCH5_R_2)
    extrude(amount=-CUT_EXTRUDE1_DEPTH, mode=Mode.SUBTRACT)

    # CSK for #6 Flat Head Machine Screw (100)1 (through all)
    with Locations(Plane(origin=(0, 0, -3.175), x_dir=(-1, 0, 0), z_dir=(0, 0, -1))):
        with Locations((90.4875, 43.815), (90.4875, 18.415), (119.0625, 7.636172046), (119.0625, 18.415), (119.0625, 43.815), (128.5875, 43.815)):
            CounterSinkHole(CSK_FOR_6_FLAT_HEAD_MACHINE_SCREW_100_D / 2, CSK_FOR_6_FLAT_HEAD_MACHINE_SCREW_100_CSINK_D / 2, counter_sink_angle=CSK_FOR_6_FLAT_HEAD_MACHINE_SCREW_100_CSINK_ANGLE)

    # Sketch8 → Cut-Extrude2 (cut, through all)
    with BuildSketch(Plane.XY):
        with Locations((-70.012401844, 73.606641948)):
            Circle(SKETCH8_R)
    extrude(amount=-CUT_EXTRUDE2_DEPTH, mode=Mode.SUBTRACT)


solid = part.part
